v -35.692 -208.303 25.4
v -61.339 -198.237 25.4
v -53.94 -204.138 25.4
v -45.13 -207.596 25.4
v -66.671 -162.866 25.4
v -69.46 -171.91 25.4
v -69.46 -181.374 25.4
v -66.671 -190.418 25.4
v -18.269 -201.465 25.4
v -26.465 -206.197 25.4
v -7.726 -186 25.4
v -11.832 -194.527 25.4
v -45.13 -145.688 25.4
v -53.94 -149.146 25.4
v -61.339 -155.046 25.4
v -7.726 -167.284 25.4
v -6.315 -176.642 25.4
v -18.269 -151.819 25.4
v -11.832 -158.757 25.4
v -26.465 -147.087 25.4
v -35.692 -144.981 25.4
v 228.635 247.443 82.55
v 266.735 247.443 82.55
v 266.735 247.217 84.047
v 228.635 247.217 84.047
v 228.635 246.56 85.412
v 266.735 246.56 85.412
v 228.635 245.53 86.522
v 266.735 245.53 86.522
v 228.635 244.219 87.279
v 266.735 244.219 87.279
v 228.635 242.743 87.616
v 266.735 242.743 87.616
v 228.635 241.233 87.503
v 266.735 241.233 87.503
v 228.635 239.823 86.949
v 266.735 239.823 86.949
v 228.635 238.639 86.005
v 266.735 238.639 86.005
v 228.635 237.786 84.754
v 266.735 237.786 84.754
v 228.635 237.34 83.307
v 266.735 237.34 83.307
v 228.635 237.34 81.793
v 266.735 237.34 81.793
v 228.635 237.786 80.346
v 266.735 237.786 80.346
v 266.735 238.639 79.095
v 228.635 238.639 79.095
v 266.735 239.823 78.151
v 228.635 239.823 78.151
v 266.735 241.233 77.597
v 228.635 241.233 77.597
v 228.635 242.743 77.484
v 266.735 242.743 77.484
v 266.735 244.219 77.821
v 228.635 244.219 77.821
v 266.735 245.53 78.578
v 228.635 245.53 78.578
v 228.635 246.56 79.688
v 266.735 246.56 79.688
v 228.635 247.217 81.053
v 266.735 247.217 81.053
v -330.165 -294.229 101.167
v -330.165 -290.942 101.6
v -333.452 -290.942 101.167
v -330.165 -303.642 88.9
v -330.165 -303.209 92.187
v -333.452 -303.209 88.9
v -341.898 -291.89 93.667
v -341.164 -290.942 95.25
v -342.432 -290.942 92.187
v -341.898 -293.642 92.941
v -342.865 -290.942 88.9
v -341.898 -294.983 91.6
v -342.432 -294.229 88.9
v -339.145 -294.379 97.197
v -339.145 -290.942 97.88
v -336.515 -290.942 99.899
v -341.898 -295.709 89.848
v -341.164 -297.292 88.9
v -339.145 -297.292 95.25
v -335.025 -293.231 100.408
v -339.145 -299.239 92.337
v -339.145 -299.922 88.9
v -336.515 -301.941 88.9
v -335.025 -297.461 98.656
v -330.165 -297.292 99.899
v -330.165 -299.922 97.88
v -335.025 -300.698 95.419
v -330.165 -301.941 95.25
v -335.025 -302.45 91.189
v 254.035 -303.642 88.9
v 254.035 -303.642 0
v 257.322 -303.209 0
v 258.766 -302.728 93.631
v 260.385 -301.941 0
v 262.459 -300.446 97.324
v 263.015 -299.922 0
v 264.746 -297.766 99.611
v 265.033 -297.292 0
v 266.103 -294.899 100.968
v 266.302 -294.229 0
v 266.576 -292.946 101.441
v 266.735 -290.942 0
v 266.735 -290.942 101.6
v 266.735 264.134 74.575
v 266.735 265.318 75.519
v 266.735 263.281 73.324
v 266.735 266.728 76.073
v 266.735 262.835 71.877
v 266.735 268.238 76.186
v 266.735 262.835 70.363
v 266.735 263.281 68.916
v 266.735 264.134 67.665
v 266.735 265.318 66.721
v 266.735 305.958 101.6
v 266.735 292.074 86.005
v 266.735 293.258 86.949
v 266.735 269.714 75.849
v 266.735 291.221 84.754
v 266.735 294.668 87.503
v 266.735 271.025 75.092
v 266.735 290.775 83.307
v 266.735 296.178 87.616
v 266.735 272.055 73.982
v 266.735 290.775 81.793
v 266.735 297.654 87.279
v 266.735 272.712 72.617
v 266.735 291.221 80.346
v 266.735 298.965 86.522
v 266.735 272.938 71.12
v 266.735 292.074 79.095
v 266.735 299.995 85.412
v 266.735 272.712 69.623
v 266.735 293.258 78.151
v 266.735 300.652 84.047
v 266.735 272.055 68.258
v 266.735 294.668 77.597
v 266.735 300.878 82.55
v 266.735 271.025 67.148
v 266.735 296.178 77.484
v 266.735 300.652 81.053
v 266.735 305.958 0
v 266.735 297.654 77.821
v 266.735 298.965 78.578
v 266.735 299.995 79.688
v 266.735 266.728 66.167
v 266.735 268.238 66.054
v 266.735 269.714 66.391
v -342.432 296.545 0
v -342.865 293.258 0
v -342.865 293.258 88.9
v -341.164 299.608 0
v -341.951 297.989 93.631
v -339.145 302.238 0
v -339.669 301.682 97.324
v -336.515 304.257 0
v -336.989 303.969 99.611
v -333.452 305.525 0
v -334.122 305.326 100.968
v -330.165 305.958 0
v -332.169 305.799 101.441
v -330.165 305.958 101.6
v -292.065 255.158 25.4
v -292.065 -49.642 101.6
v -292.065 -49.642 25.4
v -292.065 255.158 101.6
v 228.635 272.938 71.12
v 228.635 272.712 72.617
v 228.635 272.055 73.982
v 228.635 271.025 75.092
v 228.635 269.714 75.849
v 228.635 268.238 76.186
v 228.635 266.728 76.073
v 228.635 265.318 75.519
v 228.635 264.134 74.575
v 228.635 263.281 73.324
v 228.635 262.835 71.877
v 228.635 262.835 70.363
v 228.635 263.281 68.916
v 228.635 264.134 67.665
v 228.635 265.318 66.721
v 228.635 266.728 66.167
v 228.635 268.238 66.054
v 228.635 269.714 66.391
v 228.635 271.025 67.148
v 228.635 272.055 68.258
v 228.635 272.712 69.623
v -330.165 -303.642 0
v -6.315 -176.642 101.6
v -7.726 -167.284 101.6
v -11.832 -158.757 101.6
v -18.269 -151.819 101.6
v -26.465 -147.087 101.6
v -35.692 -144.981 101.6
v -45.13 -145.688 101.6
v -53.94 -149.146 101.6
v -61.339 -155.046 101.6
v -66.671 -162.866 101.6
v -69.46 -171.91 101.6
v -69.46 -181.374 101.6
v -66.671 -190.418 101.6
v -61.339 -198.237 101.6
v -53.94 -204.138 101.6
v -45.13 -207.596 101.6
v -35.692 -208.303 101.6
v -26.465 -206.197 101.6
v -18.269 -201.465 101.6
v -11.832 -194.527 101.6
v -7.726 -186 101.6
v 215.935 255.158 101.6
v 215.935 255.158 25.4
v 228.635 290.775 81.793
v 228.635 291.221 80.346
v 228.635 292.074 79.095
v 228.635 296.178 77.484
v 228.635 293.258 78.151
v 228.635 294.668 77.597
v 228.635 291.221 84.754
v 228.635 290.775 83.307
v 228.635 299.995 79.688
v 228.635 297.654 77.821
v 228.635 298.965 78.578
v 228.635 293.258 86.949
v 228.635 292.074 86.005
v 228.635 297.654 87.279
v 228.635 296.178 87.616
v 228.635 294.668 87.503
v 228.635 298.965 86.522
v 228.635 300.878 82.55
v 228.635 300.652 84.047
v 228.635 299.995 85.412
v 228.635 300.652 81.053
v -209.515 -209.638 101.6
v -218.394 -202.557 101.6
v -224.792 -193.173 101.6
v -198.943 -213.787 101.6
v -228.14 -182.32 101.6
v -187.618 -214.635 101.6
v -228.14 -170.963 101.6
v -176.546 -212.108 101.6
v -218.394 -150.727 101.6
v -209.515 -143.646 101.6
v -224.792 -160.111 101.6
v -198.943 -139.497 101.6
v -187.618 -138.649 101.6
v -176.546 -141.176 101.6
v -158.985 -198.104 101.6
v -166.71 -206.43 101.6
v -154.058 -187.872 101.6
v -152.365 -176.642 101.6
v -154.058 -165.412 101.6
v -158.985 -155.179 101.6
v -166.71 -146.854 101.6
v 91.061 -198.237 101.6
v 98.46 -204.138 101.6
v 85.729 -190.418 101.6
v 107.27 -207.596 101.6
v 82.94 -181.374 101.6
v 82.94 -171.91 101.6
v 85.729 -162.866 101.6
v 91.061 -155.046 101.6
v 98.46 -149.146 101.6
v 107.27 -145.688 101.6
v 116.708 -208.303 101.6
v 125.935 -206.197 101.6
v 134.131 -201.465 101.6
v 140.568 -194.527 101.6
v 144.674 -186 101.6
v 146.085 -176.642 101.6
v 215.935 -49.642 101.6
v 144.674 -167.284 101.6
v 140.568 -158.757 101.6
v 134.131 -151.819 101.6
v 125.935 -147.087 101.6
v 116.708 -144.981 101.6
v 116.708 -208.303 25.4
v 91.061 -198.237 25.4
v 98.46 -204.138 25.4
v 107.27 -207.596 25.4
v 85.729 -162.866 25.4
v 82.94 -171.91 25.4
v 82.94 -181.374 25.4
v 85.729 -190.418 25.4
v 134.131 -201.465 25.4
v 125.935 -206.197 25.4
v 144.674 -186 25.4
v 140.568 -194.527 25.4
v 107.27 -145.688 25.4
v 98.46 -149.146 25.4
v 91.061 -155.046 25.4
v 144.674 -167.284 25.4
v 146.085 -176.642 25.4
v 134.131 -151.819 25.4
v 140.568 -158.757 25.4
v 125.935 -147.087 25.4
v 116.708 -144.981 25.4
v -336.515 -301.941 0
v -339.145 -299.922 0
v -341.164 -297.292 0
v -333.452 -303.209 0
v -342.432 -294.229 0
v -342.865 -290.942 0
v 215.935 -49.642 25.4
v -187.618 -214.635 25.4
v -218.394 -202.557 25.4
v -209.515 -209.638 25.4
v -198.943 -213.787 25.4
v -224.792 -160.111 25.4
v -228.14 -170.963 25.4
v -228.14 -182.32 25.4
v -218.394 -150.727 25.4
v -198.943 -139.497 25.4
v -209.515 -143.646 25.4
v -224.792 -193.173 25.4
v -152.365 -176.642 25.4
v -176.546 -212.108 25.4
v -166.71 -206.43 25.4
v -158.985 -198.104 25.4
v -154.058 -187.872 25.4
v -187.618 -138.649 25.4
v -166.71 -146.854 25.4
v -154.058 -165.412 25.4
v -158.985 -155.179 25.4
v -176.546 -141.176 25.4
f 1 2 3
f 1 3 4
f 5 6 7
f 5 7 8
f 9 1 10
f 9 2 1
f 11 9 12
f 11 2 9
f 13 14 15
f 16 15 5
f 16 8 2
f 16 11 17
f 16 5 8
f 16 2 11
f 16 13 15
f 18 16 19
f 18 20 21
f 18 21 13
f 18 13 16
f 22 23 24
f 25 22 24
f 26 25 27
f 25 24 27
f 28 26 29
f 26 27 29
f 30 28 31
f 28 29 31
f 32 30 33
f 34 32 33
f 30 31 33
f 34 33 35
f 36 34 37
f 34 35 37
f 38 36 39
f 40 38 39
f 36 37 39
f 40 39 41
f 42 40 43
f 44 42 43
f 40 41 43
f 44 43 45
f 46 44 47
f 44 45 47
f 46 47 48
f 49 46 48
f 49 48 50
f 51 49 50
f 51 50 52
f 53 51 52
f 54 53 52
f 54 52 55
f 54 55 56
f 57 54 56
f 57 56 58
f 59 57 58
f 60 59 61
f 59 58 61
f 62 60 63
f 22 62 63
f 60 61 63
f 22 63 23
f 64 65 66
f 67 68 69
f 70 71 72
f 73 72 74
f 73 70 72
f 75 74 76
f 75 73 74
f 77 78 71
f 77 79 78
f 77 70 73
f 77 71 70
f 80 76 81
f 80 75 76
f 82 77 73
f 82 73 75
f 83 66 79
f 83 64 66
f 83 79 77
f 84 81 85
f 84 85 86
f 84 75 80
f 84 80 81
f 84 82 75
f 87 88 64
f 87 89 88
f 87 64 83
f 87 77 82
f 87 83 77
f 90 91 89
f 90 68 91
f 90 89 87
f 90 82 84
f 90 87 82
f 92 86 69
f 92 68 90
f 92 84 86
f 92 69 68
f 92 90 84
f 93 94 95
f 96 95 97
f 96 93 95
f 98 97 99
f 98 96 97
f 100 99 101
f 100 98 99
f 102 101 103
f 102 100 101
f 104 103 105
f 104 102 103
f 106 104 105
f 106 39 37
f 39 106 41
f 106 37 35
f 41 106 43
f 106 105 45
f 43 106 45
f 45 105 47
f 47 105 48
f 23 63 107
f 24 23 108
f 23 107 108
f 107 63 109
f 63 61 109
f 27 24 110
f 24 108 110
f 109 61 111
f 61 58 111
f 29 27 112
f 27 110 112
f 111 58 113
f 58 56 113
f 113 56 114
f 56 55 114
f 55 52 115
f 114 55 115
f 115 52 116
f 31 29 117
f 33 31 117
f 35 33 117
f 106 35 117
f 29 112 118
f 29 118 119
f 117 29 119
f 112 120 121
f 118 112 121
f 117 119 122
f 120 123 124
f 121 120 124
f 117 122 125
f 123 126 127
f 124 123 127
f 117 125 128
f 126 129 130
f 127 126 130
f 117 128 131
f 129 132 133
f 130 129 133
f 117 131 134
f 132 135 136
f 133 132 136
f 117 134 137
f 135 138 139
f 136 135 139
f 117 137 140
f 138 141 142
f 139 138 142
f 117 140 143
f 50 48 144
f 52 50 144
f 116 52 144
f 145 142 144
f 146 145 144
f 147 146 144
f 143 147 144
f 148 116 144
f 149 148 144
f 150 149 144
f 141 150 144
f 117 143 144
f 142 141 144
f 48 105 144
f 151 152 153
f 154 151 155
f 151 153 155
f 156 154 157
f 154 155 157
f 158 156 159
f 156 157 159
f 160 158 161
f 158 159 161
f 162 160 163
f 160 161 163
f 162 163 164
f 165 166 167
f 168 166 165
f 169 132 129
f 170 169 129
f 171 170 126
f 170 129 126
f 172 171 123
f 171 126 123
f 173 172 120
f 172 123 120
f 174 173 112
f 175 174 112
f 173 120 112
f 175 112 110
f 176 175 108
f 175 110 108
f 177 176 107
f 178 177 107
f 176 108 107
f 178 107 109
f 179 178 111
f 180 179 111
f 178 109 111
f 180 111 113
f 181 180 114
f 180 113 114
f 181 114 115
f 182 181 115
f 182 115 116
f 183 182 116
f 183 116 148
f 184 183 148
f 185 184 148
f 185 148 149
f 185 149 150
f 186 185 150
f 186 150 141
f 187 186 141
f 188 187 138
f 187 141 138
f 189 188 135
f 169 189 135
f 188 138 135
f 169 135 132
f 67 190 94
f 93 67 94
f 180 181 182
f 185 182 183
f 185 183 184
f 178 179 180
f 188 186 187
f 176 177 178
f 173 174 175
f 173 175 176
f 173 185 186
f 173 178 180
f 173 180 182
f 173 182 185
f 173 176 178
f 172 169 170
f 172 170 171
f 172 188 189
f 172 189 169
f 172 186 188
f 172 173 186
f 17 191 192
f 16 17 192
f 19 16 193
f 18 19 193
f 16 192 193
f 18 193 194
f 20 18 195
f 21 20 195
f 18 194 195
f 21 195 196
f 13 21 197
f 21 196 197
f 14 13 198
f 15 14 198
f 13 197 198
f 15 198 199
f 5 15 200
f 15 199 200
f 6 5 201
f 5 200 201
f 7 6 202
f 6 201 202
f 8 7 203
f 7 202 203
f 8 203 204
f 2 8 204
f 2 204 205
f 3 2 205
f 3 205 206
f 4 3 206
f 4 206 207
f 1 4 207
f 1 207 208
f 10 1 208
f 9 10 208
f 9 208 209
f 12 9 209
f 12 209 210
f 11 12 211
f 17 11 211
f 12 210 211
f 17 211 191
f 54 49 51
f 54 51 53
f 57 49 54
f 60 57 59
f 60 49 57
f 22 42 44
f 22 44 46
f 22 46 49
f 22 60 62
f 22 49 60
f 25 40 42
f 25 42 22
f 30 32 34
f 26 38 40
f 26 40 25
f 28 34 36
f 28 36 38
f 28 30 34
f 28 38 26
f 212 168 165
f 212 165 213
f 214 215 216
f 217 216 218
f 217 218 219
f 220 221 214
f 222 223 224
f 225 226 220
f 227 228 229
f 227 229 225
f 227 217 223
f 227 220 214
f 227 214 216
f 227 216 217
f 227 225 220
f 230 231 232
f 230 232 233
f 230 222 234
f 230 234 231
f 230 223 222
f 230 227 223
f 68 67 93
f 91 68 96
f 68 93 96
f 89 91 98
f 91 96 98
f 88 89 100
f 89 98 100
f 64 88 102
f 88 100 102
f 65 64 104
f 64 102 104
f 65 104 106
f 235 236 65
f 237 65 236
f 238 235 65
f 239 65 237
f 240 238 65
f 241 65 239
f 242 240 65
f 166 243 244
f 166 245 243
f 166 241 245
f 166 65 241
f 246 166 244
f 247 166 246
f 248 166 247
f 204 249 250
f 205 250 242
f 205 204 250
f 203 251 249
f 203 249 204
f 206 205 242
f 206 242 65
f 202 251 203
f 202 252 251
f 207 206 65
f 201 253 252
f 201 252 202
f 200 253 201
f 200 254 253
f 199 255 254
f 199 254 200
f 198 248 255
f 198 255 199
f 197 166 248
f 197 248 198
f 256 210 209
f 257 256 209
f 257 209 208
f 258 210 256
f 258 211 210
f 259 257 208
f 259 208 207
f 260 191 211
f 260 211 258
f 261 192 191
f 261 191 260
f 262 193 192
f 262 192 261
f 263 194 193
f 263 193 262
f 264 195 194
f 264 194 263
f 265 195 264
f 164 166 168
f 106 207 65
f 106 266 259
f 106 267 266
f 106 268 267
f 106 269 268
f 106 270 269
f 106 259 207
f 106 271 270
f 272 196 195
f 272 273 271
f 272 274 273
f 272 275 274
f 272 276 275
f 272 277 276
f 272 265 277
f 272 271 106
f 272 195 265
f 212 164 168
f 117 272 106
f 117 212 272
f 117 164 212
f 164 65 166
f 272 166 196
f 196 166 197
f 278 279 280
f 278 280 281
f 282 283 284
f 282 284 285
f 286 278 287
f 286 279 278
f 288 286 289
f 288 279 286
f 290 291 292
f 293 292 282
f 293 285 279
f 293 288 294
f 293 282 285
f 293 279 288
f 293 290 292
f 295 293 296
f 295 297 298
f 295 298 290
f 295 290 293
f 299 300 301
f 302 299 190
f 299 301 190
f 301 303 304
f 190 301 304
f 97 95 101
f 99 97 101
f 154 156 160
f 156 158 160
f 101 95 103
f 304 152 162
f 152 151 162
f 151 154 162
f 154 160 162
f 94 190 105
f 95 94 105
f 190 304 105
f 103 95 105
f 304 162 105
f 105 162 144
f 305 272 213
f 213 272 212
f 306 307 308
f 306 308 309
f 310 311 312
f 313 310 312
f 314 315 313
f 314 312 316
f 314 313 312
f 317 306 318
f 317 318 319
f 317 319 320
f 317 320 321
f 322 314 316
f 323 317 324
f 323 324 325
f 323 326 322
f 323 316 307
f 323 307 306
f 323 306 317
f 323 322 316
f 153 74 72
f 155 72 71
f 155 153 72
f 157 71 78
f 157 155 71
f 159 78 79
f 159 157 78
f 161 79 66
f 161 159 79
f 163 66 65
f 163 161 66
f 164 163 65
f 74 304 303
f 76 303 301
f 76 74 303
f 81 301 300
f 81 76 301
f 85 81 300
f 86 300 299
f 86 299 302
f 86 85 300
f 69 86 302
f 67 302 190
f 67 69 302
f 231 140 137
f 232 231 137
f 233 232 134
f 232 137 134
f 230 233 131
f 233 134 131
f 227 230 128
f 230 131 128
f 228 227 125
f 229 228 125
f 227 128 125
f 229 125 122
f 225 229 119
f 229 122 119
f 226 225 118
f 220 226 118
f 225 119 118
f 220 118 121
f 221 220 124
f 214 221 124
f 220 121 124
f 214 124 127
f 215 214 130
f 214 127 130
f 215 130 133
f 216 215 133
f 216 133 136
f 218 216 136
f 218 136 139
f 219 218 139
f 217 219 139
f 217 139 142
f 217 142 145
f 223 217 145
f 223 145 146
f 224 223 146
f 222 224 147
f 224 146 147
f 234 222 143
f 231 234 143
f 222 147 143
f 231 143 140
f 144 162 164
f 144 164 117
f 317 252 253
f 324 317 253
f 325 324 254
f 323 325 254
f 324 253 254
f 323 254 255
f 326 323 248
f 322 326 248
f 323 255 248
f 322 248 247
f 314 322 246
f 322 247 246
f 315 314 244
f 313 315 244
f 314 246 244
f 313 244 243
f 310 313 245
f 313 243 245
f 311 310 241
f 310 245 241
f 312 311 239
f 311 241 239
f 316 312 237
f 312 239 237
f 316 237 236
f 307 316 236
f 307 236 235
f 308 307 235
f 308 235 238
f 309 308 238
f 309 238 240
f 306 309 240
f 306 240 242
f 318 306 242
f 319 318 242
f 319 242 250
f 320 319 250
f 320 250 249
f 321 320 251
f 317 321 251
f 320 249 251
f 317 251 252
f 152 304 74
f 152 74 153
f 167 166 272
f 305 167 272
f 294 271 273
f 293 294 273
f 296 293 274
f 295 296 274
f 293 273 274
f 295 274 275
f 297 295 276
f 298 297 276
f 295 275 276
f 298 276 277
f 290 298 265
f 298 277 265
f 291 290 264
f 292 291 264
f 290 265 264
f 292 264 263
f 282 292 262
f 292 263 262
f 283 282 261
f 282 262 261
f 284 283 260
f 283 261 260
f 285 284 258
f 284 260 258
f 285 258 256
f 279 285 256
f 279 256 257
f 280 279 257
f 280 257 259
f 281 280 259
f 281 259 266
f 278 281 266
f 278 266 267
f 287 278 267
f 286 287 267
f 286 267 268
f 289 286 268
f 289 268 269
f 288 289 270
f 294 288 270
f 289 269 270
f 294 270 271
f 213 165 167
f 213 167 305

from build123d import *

# Parameters (mm, degrees)
F0_W     = 609.6
F0_H     = 609.6
F1_DEPTH = 101.6
F2_W     = 508
F2_H     = 304.8
F2_R     = 38.1
F2_R_2   = 31.75
F3_DEPTH = 76.2
F4_R     = 12.7
F5_R     = 5.08
F6_DEPTH = 38.1


with BuildPart() as f1:
    # F0 (on Top) → F1 (new body)
    with BuildSketch(Plane.XY):
        with Locations((-38.065076, 1.158021)):
            Rectangle(F0_W, F0_H)
    extrude(amount=F1_DEPTH)

    # F2 (on face) → F3 (cut)
    with BuildSketch(Plane.XY.offset(101.6)):
        with Locations((-38.065076, 102.758021)):
            Rectangle(F2_W, F2_H)
        with Locations((-190.465076, -176.641979)):
            Circle(F2_R)
        with Locations((-38.065076, -176.641979)):
            Circle(F2_R_2)
        with Locations((114.334924, -176.641979)):
            Circle(F2_R_2)
    extrude(amount=-F3_DEPTH, mode=Mode.SUBTRACT)

    # F4
    f4_edges = [f1.edges().sort_by_distance(p)[0] for p in [
        (-38.065076, -303.641979, 101.6),
        (266.734924, -303.641979, 50.8),
        (-342.865076, 1.158021, 101.6),
        (-342.865076, -303.641979, 50.8),
        (-342.865076, 305.958021, 50.8),
    ]]
    fillet(f4_edges, radius=F4_R)

    # F5 (on face) → F6 (cut)
    with BuildSketch(Plane.YZ.offset(266.734924)):
        with Locations((242.362949, 82.55)):
            Circle(F5_R)
        with Locations((267.858021, 71.12)):
            Circle(F5_R)
        with Locations((295.798021, 82.55)):
            Circle(F5_R)
    extrude(amount=-F6_DEPTH, mode=Mode.SUBTRACT)


solid = f1.part
